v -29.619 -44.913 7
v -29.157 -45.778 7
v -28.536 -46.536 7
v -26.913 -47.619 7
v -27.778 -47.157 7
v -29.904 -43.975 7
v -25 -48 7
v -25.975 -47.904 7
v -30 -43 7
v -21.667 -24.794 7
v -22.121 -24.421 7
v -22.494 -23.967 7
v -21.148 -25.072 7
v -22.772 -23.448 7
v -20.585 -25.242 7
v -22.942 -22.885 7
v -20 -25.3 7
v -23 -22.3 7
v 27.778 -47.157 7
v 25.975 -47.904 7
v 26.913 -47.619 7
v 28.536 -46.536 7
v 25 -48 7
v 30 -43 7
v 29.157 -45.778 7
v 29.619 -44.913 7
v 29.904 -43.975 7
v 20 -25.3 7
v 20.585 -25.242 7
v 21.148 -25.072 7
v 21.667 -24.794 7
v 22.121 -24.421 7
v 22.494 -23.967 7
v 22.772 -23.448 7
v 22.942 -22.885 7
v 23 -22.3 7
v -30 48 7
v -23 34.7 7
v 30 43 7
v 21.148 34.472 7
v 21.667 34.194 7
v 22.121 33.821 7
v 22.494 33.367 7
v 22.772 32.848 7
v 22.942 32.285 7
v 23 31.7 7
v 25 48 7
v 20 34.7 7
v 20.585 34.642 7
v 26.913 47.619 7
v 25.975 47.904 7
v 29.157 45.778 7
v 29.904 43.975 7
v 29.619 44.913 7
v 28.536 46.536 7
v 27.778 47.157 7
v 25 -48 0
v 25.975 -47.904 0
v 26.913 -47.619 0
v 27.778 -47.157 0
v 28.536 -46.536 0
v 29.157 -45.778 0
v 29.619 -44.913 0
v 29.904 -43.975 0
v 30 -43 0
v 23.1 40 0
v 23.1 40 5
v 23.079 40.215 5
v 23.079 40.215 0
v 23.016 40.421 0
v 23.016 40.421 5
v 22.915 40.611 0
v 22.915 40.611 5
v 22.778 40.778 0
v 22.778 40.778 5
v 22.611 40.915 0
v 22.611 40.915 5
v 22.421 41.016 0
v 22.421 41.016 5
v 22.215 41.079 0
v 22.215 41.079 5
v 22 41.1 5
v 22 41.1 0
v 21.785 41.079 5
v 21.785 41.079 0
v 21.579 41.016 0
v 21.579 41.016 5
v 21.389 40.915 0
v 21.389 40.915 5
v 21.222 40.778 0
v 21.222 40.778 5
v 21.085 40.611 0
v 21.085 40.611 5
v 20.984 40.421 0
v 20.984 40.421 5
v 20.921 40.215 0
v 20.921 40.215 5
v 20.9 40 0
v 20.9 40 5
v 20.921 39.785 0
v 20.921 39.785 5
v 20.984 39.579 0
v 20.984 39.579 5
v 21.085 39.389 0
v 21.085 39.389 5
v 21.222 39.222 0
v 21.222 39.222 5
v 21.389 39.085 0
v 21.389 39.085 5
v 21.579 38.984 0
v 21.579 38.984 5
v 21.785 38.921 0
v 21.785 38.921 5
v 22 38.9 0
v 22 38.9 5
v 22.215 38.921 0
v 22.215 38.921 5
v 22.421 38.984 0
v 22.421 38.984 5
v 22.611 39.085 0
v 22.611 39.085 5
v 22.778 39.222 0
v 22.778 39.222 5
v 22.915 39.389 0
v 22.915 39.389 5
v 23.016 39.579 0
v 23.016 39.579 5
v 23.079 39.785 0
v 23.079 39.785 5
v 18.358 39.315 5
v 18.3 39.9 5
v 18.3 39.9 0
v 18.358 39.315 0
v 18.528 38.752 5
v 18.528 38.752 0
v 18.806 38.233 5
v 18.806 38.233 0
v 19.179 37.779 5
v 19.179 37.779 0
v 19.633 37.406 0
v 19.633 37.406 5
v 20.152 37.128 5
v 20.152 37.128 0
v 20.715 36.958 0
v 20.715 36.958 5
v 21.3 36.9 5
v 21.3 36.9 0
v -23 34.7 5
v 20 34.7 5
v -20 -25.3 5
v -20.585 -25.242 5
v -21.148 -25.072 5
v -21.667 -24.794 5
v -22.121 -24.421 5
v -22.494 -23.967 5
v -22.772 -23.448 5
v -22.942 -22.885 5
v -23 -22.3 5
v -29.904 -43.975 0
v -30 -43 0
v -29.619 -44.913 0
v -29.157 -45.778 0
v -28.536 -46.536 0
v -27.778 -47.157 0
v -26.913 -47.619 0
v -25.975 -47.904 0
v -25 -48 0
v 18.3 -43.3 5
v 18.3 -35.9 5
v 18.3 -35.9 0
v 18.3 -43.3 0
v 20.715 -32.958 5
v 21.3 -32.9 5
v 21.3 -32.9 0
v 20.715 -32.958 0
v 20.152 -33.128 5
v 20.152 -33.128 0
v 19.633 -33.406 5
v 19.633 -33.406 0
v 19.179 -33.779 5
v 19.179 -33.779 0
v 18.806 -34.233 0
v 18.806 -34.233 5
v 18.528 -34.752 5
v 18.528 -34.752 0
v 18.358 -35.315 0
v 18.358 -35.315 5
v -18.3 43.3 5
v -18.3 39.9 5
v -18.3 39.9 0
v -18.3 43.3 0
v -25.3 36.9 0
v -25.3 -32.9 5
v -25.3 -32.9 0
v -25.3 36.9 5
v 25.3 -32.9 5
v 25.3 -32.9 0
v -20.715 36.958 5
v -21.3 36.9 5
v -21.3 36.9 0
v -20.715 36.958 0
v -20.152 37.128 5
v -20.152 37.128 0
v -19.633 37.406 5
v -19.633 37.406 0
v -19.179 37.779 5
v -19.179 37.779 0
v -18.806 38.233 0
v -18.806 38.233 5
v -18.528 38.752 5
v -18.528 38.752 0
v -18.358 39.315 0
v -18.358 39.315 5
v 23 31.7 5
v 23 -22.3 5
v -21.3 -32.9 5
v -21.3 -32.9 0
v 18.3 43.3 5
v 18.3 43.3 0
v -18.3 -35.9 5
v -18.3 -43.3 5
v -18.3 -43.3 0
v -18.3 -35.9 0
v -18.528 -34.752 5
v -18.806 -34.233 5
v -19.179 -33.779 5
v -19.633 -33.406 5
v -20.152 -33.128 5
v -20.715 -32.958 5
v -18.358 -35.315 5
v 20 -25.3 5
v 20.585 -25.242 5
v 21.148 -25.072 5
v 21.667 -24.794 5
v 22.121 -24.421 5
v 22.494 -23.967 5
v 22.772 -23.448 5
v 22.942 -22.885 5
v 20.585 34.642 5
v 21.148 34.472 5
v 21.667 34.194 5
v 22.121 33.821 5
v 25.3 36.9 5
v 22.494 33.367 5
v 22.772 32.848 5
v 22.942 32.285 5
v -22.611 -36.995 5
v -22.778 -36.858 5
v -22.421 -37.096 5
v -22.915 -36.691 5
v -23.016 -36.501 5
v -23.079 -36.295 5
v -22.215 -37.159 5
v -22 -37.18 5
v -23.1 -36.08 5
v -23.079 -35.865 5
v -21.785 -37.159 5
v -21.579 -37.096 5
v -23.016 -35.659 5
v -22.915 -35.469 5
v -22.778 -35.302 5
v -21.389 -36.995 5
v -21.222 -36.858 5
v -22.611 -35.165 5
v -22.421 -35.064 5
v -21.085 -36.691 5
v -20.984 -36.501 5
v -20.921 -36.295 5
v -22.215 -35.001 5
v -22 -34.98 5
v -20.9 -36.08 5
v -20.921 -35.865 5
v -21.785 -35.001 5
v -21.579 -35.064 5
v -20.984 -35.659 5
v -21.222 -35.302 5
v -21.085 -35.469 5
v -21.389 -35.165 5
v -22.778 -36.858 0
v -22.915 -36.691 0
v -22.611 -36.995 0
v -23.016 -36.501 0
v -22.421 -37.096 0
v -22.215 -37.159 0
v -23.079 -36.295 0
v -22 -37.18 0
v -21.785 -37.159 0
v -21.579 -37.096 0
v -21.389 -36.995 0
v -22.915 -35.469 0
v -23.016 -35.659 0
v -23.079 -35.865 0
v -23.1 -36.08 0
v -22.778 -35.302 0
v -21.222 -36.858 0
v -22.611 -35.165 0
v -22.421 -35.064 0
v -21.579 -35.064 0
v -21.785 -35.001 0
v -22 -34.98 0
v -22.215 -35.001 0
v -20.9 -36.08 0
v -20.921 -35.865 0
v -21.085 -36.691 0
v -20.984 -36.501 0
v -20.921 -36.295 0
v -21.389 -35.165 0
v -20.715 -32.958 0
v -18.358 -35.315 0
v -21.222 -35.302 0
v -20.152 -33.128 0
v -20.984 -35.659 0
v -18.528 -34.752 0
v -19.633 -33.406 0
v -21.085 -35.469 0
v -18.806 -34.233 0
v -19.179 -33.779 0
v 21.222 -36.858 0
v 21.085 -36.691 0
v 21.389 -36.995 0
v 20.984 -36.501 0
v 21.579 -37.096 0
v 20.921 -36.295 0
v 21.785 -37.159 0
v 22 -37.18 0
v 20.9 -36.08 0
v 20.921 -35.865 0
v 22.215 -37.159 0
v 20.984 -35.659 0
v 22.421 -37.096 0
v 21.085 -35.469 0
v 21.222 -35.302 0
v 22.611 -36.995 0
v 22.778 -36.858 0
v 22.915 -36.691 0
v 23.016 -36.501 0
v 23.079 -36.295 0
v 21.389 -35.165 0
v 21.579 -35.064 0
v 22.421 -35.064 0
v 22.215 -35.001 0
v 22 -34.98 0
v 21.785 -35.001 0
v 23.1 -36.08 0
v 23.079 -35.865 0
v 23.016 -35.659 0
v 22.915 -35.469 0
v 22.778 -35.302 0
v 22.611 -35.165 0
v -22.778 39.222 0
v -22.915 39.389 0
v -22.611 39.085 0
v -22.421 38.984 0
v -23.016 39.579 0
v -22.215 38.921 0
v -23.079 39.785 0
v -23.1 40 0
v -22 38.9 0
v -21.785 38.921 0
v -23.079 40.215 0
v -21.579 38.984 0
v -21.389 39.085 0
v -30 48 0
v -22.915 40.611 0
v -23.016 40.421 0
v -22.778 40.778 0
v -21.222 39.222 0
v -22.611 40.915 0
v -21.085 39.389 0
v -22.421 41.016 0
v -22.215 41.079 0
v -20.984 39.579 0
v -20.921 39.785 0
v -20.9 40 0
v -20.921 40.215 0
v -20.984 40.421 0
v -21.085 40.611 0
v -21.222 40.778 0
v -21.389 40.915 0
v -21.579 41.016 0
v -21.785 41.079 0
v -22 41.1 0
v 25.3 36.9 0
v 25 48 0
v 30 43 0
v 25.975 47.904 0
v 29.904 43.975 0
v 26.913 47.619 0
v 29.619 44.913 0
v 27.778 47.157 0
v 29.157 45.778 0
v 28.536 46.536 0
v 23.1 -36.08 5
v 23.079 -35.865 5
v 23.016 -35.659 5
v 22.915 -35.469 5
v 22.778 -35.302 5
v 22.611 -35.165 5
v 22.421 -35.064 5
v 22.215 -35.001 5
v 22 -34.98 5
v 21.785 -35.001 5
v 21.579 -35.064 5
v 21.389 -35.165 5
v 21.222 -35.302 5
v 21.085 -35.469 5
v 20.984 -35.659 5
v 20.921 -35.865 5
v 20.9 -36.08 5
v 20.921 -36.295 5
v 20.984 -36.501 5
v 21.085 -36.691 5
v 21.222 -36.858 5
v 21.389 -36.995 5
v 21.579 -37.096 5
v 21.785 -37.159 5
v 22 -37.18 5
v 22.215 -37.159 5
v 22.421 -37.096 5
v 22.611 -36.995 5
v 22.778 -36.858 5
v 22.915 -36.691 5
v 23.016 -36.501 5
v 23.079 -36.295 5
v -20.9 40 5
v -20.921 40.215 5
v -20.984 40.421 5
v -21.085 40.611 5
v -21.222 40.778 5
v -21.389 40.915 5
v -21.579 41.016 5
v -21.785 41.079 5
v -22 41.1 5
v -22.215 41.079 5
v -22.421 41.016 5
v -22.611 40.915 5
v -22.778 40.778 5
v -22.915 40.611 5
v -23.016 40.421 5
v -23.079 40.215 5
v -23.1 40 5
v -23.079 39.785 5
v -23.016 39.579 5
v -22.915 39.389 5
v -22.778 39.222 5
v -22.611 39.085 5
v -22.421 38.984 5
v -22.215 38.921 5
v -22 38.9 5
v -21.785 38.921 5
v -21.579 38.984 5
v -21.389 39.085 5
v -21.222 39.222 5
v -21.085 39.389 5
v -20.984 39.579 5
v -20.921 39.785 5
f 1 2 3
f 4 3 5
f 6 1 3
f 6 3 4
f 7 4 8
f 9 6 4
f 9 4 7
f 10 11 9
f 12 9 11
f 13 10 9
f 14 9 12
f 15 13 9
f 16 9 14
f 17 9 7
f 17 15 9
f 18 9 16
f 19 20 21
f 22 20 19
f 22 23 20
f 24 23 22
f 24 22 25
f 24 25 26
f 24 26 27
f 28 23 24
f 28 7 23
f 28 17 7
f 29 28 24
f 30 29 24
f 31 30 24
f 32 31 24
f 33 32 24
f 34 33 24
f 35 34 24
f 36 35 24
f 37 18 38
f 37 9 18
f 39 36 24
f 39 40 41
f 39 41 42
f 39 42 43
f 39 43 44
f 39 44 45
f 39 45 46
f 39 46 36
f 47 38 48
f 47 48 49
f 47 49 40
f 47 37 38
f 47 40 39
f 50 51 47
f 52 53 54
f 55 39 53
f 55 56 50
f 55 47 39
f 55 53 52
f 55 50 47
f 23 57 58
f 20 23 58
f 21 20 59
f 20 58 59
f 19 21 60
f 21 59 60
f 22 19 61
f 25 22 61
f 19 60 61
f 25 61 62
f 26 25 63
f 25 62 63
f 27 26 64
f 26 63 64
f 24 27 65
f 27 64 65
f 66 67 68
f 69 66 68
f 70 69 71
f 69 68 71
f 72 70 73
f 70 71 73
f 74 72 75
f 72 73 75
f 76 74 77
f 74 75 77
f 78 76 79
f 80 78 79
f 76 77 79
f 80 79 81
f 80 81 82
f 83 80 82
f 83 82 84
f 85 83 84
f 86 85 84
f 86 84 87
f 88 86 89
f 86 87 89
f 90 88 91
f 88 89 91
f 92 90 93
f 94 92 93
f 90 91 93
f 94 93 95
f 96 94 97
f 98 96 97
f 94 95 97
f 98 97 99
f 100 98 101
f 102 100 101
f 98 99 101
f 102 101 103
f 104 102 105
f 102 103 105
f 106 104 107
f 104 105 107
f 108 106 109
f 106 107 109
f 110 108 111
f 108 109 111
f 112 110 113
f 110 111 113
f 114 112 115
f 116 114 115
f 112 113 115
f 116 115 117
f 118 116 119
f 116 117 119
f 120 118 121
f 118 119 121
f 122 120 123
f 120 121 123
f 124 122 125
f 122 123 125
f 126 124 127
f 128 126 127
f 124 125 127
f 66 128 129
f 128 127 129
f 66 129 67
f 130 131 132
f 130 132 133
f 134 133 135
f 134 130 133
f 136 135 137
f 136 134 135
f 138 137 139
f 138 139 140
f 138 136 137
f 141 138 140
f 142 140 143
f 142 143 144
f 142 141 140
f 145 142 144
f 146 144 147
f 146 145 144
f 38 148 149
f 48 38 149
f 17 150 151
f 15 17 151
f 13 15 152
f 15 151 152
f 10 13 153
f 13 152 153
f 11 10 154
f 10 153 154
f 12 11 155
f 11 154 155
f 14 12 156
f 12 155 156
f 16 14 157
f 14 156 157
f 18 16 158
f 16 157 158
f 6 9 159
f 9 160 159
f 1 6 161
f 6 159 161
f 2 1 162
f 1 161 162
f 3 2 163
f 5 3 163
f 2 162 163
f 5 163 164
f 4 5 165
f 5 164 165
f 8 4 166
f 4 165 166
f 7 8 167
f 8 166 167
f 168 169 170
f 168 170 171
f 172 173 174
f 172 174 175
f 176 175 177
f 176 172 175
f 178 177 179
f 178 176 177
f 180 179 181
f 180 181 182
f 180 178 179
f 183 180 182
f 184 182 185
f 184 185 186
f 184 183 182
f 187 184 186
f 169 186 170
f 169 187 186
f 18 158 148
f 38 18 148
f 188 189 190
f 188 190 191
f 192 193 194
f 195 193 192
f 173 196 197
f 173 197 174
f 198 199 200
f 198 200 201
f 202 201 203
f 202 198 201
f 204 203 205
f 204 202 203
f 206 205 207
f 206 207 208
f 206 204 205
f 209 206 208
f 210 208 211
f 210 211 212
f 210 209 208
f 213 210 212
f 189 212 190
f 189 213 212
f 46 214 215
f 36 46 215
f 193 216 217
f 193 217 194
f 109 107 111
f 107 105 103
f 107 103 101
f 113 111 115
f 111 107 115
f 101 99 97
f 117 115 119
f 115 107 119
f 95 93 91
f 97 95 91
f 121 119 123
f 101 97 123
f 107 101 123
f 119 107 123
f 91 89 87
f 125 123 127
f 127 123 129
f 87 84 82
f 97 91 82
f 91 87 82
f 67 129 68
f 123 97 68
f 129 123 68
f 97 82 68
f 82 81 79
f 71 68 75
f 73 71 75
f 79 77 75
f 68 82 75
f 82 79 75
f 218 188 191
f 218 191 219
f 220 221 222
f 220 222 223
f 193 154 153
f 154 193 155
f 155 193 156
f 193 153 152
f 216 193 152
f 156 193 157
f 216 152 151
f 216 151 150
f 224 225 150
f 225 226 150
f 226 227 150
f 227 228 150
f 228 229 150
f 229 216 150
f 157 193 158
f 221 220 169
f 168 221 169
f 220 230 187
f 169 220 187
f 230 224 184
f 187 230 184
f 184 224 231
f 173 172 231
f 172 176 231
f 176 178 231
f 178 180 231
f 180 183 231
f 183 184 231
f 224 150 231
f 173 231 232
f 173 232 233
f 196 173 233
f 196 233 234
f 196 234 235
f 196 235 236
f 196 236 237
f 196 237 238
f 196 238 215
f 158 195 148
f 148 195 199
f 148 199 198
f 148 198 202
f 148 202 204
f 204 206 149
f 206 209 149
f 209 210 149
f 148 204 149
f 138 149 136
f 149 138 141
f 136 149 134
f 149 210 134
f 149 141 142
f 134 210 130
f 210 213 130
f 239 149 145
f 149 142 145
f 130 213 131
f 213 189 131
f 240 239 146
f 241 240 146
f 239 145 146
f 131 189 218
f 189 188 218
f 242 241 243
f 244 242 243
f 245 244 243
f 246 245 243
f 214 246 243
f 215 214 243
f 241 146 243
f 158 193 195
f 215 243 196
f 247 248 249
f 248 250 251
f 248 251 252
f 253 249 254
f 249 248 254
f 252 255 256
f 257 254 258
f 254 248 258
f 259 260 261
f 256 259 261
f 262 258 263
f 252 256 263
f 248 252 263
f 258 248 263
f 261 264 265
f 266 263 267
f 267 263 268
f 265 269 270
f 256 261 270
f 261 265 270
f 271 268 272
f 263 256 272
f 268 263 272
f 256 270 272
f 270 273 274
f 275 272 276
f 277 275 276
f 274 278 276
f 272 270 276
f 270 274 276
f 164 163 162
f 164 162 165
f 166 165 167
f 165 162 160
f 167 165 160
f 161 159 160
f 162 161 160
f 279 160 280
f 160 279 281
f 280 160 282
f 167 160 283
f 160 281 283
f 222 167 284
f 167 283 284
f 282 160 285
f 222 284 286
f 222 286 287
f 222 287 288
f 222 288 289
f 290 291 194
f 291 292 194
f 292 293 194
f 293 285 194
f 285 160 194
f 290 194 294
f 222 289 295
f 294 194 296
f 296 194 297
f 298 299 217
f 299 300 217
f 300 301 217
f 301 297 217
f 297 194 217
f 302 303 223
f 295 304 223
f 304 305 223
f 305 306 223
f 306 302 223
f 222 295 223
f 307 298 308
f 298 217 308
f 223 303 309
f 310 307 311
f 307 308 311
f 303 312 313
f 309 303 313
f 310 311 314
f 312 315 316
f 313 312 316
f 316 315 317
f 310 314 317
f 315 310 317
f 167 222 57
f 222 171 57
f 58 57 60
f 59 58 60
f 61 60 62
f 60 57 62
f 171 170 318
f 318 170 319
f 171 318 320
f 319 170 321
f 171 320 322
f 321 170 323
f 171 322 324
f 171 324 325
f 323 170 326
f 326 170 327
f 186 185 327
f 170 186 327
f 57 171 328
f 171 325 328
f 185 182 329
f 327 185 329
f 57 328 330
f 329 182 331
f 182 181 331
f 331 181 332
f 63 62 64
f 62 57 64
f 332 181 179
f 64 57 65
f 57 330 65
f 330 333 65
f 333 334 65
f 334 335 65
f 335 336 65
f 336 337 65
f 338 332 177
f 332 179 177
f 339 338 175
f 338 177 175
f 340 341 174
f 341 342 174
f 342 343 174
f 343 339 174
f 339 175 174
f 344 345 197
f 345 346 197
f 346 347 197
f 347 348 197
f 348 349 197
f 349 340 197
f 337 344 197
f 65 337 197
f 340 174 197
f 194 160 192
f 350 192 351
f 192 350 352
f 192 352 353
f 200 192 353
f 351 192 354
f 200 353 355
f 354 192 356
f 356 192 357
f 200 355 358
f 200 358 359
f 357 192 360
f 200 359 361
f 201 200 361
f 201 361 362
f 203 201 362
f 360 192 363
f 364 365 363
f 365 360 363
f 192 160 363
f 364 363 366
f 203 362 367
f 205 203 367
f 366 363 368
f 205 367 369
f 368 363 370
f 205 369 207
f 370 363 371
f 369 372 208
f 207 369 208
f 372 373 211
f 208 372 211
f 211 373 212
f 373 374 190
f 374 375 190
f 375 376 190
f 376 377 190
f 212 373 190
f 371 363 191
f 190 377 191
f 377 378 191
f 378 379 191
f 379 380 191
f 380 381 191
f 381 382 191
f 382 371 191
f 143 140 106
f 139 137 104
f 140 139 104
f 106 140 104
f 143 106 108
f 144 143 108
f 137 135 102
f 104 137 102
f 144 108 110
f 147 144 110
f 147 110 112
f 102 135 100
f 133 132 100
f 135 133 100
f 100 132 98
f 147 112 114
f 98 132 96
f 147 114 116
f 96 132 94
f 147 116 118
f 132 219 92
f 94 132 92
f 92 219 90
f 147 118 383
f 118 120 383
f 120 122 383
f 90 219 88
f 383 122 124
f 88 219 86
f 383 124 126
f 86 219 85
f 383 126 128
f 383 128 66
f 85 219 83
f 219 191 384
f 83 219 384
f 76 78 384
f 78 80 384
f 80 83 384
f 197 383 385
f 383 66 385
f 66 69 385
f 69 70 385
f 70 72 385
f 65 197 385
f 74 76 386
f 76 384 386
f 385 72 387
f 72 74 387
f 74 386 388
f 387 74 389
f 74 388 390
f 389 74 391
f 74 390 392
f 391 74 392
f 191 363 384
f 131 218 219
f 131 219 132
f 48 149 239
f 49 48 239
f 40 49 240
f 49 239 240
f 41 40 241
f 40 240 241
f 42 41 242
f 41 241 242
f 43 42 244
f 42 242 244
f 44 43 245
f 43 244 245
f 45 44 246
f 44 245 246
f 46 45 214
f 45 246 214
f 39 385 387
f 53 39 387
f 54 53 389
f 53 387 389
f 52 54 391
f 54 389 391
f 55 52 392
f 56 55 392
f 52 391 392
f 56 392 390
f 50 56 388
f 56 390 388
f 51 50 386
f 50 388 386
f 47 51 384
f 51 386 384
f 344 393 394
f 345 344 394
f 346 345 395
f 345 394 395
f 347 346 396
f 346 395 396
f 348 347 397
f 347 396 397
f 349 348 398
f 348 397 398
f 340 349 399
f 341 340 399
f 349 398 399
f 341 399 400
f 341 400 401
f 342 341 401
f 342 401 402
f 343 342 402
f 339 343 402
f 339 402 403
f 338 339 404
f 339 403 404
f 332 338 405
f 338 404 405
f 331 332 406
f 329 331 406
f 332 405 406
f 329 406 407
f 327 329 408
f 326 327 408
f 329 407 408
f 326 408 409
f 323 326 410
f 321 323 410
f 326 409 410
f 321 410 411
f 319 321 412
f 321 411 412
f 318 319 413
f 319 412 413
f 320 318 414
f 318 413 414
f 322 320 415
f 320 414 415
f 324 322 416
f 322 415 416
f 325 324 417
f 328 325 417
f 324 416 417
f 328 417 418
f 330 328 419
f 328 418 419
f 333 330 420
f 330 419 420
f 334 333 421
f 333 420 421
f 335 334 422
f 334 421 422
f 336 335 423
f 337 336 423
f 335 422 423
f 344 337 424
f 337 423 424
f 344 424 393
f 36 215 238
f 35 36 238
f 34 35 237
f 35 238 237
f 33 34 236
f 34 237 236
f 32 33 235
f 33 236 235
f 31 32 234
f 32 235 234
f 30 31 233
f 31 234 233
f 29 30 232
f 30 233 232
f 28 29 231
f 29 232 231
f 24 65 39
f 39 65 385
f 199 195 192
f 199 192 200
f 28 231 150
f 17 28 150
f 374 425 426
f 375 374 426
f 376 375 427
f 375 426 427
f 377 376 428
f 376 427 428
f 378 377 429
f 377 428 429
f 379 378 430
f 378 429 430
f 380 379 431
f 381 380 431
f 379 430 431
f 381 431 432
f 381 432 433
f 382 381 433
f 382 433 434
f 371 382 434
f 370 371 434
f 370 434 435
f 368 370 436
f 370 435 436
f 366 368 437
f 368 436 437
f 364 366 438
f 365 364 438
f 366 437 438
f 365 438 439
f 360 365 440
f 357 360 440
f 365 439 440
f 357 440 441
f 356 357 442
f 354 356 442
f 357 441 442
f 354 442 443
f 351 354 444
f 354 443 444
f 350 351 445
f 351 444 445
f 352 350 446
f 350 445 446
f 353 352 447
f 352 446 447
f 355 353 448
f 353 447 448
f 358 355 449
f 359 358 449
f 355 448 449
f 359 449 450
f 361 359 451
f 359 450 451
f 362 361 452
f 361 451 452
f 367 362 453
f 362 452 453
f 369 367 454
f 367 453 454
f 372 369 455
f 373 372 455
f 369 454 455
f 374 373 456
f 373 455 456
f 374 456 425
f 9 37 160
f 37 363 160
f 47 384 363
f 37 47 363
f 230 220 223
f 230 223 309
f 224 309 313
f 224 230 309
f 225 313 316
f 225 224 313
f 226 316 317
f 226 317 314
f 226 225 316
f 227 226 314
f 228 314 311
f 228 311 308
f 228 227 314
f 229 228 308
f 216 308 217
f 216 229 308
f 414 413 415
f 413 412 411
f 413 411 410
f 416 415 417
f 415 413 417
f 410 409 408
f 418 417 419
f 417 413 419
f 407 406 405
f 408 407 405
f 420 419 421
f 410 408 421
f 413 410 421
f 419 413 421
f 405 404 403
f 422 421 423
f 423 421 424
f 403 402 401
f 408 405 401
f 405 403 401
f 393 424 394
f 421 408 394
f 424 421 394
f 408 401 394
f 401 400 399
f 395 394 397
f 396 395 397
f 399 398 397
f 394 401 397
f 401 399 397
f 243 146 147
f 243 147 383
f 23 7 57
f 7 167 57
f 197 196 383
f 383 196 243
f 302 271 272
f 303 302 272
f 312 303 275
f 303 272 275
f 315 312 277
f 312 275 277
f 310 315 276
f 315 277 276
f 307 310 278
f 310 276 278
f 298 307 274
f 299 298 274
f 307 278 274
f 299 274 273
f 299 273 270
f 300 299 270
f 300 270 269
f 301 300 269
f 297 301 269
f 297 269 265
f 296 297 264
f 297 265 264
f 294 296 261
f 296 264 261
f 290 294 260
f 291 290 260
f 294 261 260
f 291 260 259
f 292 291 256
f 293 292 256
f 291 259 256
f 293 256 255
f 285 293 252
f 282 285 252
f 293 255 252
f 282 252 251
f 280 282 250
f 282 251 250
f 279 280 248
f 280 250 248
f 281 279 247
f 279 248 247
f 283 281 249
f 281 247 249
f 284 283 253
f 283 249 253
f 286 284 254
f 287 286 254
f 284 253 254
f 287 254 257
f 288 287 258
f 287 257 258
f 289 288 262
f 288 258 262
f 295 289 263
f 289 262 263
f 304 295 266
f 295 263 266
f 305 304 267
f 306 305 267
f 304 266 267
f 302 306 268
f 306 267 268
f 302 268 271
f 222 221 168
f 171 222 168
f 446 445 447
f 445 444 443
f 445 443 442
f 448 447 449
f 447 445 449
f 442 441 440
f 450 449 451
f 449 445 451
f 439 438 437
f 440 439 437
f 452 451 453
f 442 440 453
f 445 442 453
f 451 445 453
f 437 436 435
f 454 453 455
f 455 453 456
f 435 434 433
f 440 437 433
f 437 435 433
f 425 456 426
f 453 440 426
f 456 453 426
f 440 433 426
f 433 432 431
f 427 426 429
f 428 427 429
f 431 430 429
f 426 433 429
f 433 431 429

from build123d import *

# Parameters (mm, degrees)
F0_R     = 1.5
F1_DEPTH = 5
F2_W     = 50.6
F2_H     = 86.6
F2_R     = 1.5
F3_DEPTH = 5
F4_R     = 1.1
F5_DEPTH = 5
F7_DEPTH = 2


with BuildPart() as f1:
    # F0 (on Top) → F1 (new body)
    with BuildSketch(Plane.XY):
        with BuildLine():
            Line((-25, -48), (25, -48))
            ThreePointArc((25, -48), (28.535534, -46.535534), (30, -43))
            Line((30, -43), (30, 43))
            ThreePointArc((30, 43), (28.535534, 46.535534), (25, 48))
            Line((25, 48), (-27, 48))
            Line((-27, 48), (-30, 48))
            Line((-30, 48), (-30, 43))
            Line((-30, 43), (-30, -43))
            ThreePointArc((-30, -43), (-28.535534, -46.535534), (-25, -48))
        make_face()
        with Locations((-22, -36.08)):
            Circle(F0_R, mode=Mode.SUBTRACT)
        with Locations((22, -36.08)):
            Circle(F0_R, mode=Mode.SUBTRACT)
        with Locations((-22, 40)):
            Circle(F0_R, mode=Mode.SUBTRACT)
        with Locations((22, 40)):
            Circle(F0_R, mode=Mode.SUBTRACT)
    extrude(amount=F1_DEPTH)

    # F2 (on face) → F3 (cut)
    with BuildSketch(Plane.XY.offset(5)):
        Rectangle(F2_W, F2_H)
        with Locations((-22, -36.08)):
            Circle(F2_R, mode=Mode.SUBTRACT)
        with Locations((22, -36.08)):
            Circle(F2_R, mode=Mode.SUBTRACT)
        with Locations((-22, 40)):
            Circle(F2_R, mode=Mode.SUBTRACT)
        with Locations((22, 40)):
            Circle(F2_R, mode=Mode.SUBTRACT)
    extrude(amount=-F3_DEPTH, mode=Mode.SUBTRACT)

    # F4 (on face) → F5 (join)
    with BuildSketch(Plane.XY.offset(5)):
        with BuildLine():
            Line((-18.3, 43.3), (-25.3, 43.3))
            Line((-25.3, 43.3), (-25.3, 36.9))
            Line((-25.3, 36.9), (-21.3, 36.9))
            ThreePointArc((-21.3, 36.9), (-19.17868, 37.77868), (-18.3, 39.9))
            Line((-18.3, 39.9), (-18.3, 43.3))
        make_face()
        with Locations((-22, 40)):
            Circle(F4_R, mode=Mode.SUBTRACT)
        with BuildLine():
            Line((25.3, 36.9), (25.3, 43.3))
            Line((25.3, 43.3), (18.3, 43.3))
            Line((18.3, 43.3), (18.3, 39.9))
            ThreePointArc((18.3, 39.9), (19.17868, 37.77868), (21.3, 36.9))
            Line((21.3, 36.9), (25.3, 36.9))
        make_face()
        with Locations((22, 40)):
            Circle(F4_R, mode=Mode.SUBTRACT)
        with BuildLine():
            Line((18.3, -43.3), (25.3, -43.3))
            Line((25.3, -43.3), (25.3, -32.9))
            Line((25.3, -32.9), (21.3, -32.9))
            ThreePointArc((21.3, -32.9), (19.17868, -33.77868), (18.3, -35.9))
            Line((18.3, -35.9), (18.3, -43.3))
        make_face()
        with Locations((22, -36.08)):
            Circle(F4_R, mode=Mode.SUBTRACT)
        with BuildLine():
            Line((-25.3, -32.9), (-25.3, -43.3))
            Line((-25.3, -43.3), (-18.3, -43.3))
            Line((-18.3, -43.3), (-18.3, -35.9))
            ThreePointArc((-18.3, -35.9), (-19.17868, -33.77868), (-21.3, -32.9))
            Line((-21.3, -32.9), (-25.3, -32.9))
        make_face()
        with Locations((-22, -36.08)):
            Circle(F4_R, mode=Mode.SUBTRACT)
    extrude(amount=-F5_DEPTH)

    # F6 (on face) → F7 (join)
    with BuildSketch(Plane.XY.offset(5)):
        with BuildLine():
            Line((25, 48), (-30, 48))
            Line((-30, 48), (-30, -43))
            ThreePointArc((-30, -43), (-28.535534, -46.535534), (-25, -48))
            Line((-25, -48), (25, -48))
            ThreePointArc((25, -48), (28.535534, -46.535534), (30, -43))
            Line((30, -43), (30, 43))
            ThreePointArc((30, 43), (28.535534, 46.535534), (25, 48))
        make_face()
        with BuildLine():
            Line((-23, 34.7), (-20, 34.7))
            Line((-20, 34.7), (20, 34.7))
            ThreePointArc((20, 34.7), (22.12132, 33.82132), (23, 31.7))
            Line((23, 31.7), (23, -22.3))
            ThreePointArc((23, -22.3), (22.12132, -24.42132), (20, -25.3))
            Line((20, -25.3), (-20, -25.3))
            ThreePointArc((-20, -25.3), (-22.12132, -24.42132), (-23, -22.3))
            Line((-23, -22.3), (-23, 31.7))
            Line((-23, 31.7), (-23, 34.7))
        make_face(mode=Mode.SUBTRACT)
    extrude(amount=F7_DEPTH)


solid = f1.part
